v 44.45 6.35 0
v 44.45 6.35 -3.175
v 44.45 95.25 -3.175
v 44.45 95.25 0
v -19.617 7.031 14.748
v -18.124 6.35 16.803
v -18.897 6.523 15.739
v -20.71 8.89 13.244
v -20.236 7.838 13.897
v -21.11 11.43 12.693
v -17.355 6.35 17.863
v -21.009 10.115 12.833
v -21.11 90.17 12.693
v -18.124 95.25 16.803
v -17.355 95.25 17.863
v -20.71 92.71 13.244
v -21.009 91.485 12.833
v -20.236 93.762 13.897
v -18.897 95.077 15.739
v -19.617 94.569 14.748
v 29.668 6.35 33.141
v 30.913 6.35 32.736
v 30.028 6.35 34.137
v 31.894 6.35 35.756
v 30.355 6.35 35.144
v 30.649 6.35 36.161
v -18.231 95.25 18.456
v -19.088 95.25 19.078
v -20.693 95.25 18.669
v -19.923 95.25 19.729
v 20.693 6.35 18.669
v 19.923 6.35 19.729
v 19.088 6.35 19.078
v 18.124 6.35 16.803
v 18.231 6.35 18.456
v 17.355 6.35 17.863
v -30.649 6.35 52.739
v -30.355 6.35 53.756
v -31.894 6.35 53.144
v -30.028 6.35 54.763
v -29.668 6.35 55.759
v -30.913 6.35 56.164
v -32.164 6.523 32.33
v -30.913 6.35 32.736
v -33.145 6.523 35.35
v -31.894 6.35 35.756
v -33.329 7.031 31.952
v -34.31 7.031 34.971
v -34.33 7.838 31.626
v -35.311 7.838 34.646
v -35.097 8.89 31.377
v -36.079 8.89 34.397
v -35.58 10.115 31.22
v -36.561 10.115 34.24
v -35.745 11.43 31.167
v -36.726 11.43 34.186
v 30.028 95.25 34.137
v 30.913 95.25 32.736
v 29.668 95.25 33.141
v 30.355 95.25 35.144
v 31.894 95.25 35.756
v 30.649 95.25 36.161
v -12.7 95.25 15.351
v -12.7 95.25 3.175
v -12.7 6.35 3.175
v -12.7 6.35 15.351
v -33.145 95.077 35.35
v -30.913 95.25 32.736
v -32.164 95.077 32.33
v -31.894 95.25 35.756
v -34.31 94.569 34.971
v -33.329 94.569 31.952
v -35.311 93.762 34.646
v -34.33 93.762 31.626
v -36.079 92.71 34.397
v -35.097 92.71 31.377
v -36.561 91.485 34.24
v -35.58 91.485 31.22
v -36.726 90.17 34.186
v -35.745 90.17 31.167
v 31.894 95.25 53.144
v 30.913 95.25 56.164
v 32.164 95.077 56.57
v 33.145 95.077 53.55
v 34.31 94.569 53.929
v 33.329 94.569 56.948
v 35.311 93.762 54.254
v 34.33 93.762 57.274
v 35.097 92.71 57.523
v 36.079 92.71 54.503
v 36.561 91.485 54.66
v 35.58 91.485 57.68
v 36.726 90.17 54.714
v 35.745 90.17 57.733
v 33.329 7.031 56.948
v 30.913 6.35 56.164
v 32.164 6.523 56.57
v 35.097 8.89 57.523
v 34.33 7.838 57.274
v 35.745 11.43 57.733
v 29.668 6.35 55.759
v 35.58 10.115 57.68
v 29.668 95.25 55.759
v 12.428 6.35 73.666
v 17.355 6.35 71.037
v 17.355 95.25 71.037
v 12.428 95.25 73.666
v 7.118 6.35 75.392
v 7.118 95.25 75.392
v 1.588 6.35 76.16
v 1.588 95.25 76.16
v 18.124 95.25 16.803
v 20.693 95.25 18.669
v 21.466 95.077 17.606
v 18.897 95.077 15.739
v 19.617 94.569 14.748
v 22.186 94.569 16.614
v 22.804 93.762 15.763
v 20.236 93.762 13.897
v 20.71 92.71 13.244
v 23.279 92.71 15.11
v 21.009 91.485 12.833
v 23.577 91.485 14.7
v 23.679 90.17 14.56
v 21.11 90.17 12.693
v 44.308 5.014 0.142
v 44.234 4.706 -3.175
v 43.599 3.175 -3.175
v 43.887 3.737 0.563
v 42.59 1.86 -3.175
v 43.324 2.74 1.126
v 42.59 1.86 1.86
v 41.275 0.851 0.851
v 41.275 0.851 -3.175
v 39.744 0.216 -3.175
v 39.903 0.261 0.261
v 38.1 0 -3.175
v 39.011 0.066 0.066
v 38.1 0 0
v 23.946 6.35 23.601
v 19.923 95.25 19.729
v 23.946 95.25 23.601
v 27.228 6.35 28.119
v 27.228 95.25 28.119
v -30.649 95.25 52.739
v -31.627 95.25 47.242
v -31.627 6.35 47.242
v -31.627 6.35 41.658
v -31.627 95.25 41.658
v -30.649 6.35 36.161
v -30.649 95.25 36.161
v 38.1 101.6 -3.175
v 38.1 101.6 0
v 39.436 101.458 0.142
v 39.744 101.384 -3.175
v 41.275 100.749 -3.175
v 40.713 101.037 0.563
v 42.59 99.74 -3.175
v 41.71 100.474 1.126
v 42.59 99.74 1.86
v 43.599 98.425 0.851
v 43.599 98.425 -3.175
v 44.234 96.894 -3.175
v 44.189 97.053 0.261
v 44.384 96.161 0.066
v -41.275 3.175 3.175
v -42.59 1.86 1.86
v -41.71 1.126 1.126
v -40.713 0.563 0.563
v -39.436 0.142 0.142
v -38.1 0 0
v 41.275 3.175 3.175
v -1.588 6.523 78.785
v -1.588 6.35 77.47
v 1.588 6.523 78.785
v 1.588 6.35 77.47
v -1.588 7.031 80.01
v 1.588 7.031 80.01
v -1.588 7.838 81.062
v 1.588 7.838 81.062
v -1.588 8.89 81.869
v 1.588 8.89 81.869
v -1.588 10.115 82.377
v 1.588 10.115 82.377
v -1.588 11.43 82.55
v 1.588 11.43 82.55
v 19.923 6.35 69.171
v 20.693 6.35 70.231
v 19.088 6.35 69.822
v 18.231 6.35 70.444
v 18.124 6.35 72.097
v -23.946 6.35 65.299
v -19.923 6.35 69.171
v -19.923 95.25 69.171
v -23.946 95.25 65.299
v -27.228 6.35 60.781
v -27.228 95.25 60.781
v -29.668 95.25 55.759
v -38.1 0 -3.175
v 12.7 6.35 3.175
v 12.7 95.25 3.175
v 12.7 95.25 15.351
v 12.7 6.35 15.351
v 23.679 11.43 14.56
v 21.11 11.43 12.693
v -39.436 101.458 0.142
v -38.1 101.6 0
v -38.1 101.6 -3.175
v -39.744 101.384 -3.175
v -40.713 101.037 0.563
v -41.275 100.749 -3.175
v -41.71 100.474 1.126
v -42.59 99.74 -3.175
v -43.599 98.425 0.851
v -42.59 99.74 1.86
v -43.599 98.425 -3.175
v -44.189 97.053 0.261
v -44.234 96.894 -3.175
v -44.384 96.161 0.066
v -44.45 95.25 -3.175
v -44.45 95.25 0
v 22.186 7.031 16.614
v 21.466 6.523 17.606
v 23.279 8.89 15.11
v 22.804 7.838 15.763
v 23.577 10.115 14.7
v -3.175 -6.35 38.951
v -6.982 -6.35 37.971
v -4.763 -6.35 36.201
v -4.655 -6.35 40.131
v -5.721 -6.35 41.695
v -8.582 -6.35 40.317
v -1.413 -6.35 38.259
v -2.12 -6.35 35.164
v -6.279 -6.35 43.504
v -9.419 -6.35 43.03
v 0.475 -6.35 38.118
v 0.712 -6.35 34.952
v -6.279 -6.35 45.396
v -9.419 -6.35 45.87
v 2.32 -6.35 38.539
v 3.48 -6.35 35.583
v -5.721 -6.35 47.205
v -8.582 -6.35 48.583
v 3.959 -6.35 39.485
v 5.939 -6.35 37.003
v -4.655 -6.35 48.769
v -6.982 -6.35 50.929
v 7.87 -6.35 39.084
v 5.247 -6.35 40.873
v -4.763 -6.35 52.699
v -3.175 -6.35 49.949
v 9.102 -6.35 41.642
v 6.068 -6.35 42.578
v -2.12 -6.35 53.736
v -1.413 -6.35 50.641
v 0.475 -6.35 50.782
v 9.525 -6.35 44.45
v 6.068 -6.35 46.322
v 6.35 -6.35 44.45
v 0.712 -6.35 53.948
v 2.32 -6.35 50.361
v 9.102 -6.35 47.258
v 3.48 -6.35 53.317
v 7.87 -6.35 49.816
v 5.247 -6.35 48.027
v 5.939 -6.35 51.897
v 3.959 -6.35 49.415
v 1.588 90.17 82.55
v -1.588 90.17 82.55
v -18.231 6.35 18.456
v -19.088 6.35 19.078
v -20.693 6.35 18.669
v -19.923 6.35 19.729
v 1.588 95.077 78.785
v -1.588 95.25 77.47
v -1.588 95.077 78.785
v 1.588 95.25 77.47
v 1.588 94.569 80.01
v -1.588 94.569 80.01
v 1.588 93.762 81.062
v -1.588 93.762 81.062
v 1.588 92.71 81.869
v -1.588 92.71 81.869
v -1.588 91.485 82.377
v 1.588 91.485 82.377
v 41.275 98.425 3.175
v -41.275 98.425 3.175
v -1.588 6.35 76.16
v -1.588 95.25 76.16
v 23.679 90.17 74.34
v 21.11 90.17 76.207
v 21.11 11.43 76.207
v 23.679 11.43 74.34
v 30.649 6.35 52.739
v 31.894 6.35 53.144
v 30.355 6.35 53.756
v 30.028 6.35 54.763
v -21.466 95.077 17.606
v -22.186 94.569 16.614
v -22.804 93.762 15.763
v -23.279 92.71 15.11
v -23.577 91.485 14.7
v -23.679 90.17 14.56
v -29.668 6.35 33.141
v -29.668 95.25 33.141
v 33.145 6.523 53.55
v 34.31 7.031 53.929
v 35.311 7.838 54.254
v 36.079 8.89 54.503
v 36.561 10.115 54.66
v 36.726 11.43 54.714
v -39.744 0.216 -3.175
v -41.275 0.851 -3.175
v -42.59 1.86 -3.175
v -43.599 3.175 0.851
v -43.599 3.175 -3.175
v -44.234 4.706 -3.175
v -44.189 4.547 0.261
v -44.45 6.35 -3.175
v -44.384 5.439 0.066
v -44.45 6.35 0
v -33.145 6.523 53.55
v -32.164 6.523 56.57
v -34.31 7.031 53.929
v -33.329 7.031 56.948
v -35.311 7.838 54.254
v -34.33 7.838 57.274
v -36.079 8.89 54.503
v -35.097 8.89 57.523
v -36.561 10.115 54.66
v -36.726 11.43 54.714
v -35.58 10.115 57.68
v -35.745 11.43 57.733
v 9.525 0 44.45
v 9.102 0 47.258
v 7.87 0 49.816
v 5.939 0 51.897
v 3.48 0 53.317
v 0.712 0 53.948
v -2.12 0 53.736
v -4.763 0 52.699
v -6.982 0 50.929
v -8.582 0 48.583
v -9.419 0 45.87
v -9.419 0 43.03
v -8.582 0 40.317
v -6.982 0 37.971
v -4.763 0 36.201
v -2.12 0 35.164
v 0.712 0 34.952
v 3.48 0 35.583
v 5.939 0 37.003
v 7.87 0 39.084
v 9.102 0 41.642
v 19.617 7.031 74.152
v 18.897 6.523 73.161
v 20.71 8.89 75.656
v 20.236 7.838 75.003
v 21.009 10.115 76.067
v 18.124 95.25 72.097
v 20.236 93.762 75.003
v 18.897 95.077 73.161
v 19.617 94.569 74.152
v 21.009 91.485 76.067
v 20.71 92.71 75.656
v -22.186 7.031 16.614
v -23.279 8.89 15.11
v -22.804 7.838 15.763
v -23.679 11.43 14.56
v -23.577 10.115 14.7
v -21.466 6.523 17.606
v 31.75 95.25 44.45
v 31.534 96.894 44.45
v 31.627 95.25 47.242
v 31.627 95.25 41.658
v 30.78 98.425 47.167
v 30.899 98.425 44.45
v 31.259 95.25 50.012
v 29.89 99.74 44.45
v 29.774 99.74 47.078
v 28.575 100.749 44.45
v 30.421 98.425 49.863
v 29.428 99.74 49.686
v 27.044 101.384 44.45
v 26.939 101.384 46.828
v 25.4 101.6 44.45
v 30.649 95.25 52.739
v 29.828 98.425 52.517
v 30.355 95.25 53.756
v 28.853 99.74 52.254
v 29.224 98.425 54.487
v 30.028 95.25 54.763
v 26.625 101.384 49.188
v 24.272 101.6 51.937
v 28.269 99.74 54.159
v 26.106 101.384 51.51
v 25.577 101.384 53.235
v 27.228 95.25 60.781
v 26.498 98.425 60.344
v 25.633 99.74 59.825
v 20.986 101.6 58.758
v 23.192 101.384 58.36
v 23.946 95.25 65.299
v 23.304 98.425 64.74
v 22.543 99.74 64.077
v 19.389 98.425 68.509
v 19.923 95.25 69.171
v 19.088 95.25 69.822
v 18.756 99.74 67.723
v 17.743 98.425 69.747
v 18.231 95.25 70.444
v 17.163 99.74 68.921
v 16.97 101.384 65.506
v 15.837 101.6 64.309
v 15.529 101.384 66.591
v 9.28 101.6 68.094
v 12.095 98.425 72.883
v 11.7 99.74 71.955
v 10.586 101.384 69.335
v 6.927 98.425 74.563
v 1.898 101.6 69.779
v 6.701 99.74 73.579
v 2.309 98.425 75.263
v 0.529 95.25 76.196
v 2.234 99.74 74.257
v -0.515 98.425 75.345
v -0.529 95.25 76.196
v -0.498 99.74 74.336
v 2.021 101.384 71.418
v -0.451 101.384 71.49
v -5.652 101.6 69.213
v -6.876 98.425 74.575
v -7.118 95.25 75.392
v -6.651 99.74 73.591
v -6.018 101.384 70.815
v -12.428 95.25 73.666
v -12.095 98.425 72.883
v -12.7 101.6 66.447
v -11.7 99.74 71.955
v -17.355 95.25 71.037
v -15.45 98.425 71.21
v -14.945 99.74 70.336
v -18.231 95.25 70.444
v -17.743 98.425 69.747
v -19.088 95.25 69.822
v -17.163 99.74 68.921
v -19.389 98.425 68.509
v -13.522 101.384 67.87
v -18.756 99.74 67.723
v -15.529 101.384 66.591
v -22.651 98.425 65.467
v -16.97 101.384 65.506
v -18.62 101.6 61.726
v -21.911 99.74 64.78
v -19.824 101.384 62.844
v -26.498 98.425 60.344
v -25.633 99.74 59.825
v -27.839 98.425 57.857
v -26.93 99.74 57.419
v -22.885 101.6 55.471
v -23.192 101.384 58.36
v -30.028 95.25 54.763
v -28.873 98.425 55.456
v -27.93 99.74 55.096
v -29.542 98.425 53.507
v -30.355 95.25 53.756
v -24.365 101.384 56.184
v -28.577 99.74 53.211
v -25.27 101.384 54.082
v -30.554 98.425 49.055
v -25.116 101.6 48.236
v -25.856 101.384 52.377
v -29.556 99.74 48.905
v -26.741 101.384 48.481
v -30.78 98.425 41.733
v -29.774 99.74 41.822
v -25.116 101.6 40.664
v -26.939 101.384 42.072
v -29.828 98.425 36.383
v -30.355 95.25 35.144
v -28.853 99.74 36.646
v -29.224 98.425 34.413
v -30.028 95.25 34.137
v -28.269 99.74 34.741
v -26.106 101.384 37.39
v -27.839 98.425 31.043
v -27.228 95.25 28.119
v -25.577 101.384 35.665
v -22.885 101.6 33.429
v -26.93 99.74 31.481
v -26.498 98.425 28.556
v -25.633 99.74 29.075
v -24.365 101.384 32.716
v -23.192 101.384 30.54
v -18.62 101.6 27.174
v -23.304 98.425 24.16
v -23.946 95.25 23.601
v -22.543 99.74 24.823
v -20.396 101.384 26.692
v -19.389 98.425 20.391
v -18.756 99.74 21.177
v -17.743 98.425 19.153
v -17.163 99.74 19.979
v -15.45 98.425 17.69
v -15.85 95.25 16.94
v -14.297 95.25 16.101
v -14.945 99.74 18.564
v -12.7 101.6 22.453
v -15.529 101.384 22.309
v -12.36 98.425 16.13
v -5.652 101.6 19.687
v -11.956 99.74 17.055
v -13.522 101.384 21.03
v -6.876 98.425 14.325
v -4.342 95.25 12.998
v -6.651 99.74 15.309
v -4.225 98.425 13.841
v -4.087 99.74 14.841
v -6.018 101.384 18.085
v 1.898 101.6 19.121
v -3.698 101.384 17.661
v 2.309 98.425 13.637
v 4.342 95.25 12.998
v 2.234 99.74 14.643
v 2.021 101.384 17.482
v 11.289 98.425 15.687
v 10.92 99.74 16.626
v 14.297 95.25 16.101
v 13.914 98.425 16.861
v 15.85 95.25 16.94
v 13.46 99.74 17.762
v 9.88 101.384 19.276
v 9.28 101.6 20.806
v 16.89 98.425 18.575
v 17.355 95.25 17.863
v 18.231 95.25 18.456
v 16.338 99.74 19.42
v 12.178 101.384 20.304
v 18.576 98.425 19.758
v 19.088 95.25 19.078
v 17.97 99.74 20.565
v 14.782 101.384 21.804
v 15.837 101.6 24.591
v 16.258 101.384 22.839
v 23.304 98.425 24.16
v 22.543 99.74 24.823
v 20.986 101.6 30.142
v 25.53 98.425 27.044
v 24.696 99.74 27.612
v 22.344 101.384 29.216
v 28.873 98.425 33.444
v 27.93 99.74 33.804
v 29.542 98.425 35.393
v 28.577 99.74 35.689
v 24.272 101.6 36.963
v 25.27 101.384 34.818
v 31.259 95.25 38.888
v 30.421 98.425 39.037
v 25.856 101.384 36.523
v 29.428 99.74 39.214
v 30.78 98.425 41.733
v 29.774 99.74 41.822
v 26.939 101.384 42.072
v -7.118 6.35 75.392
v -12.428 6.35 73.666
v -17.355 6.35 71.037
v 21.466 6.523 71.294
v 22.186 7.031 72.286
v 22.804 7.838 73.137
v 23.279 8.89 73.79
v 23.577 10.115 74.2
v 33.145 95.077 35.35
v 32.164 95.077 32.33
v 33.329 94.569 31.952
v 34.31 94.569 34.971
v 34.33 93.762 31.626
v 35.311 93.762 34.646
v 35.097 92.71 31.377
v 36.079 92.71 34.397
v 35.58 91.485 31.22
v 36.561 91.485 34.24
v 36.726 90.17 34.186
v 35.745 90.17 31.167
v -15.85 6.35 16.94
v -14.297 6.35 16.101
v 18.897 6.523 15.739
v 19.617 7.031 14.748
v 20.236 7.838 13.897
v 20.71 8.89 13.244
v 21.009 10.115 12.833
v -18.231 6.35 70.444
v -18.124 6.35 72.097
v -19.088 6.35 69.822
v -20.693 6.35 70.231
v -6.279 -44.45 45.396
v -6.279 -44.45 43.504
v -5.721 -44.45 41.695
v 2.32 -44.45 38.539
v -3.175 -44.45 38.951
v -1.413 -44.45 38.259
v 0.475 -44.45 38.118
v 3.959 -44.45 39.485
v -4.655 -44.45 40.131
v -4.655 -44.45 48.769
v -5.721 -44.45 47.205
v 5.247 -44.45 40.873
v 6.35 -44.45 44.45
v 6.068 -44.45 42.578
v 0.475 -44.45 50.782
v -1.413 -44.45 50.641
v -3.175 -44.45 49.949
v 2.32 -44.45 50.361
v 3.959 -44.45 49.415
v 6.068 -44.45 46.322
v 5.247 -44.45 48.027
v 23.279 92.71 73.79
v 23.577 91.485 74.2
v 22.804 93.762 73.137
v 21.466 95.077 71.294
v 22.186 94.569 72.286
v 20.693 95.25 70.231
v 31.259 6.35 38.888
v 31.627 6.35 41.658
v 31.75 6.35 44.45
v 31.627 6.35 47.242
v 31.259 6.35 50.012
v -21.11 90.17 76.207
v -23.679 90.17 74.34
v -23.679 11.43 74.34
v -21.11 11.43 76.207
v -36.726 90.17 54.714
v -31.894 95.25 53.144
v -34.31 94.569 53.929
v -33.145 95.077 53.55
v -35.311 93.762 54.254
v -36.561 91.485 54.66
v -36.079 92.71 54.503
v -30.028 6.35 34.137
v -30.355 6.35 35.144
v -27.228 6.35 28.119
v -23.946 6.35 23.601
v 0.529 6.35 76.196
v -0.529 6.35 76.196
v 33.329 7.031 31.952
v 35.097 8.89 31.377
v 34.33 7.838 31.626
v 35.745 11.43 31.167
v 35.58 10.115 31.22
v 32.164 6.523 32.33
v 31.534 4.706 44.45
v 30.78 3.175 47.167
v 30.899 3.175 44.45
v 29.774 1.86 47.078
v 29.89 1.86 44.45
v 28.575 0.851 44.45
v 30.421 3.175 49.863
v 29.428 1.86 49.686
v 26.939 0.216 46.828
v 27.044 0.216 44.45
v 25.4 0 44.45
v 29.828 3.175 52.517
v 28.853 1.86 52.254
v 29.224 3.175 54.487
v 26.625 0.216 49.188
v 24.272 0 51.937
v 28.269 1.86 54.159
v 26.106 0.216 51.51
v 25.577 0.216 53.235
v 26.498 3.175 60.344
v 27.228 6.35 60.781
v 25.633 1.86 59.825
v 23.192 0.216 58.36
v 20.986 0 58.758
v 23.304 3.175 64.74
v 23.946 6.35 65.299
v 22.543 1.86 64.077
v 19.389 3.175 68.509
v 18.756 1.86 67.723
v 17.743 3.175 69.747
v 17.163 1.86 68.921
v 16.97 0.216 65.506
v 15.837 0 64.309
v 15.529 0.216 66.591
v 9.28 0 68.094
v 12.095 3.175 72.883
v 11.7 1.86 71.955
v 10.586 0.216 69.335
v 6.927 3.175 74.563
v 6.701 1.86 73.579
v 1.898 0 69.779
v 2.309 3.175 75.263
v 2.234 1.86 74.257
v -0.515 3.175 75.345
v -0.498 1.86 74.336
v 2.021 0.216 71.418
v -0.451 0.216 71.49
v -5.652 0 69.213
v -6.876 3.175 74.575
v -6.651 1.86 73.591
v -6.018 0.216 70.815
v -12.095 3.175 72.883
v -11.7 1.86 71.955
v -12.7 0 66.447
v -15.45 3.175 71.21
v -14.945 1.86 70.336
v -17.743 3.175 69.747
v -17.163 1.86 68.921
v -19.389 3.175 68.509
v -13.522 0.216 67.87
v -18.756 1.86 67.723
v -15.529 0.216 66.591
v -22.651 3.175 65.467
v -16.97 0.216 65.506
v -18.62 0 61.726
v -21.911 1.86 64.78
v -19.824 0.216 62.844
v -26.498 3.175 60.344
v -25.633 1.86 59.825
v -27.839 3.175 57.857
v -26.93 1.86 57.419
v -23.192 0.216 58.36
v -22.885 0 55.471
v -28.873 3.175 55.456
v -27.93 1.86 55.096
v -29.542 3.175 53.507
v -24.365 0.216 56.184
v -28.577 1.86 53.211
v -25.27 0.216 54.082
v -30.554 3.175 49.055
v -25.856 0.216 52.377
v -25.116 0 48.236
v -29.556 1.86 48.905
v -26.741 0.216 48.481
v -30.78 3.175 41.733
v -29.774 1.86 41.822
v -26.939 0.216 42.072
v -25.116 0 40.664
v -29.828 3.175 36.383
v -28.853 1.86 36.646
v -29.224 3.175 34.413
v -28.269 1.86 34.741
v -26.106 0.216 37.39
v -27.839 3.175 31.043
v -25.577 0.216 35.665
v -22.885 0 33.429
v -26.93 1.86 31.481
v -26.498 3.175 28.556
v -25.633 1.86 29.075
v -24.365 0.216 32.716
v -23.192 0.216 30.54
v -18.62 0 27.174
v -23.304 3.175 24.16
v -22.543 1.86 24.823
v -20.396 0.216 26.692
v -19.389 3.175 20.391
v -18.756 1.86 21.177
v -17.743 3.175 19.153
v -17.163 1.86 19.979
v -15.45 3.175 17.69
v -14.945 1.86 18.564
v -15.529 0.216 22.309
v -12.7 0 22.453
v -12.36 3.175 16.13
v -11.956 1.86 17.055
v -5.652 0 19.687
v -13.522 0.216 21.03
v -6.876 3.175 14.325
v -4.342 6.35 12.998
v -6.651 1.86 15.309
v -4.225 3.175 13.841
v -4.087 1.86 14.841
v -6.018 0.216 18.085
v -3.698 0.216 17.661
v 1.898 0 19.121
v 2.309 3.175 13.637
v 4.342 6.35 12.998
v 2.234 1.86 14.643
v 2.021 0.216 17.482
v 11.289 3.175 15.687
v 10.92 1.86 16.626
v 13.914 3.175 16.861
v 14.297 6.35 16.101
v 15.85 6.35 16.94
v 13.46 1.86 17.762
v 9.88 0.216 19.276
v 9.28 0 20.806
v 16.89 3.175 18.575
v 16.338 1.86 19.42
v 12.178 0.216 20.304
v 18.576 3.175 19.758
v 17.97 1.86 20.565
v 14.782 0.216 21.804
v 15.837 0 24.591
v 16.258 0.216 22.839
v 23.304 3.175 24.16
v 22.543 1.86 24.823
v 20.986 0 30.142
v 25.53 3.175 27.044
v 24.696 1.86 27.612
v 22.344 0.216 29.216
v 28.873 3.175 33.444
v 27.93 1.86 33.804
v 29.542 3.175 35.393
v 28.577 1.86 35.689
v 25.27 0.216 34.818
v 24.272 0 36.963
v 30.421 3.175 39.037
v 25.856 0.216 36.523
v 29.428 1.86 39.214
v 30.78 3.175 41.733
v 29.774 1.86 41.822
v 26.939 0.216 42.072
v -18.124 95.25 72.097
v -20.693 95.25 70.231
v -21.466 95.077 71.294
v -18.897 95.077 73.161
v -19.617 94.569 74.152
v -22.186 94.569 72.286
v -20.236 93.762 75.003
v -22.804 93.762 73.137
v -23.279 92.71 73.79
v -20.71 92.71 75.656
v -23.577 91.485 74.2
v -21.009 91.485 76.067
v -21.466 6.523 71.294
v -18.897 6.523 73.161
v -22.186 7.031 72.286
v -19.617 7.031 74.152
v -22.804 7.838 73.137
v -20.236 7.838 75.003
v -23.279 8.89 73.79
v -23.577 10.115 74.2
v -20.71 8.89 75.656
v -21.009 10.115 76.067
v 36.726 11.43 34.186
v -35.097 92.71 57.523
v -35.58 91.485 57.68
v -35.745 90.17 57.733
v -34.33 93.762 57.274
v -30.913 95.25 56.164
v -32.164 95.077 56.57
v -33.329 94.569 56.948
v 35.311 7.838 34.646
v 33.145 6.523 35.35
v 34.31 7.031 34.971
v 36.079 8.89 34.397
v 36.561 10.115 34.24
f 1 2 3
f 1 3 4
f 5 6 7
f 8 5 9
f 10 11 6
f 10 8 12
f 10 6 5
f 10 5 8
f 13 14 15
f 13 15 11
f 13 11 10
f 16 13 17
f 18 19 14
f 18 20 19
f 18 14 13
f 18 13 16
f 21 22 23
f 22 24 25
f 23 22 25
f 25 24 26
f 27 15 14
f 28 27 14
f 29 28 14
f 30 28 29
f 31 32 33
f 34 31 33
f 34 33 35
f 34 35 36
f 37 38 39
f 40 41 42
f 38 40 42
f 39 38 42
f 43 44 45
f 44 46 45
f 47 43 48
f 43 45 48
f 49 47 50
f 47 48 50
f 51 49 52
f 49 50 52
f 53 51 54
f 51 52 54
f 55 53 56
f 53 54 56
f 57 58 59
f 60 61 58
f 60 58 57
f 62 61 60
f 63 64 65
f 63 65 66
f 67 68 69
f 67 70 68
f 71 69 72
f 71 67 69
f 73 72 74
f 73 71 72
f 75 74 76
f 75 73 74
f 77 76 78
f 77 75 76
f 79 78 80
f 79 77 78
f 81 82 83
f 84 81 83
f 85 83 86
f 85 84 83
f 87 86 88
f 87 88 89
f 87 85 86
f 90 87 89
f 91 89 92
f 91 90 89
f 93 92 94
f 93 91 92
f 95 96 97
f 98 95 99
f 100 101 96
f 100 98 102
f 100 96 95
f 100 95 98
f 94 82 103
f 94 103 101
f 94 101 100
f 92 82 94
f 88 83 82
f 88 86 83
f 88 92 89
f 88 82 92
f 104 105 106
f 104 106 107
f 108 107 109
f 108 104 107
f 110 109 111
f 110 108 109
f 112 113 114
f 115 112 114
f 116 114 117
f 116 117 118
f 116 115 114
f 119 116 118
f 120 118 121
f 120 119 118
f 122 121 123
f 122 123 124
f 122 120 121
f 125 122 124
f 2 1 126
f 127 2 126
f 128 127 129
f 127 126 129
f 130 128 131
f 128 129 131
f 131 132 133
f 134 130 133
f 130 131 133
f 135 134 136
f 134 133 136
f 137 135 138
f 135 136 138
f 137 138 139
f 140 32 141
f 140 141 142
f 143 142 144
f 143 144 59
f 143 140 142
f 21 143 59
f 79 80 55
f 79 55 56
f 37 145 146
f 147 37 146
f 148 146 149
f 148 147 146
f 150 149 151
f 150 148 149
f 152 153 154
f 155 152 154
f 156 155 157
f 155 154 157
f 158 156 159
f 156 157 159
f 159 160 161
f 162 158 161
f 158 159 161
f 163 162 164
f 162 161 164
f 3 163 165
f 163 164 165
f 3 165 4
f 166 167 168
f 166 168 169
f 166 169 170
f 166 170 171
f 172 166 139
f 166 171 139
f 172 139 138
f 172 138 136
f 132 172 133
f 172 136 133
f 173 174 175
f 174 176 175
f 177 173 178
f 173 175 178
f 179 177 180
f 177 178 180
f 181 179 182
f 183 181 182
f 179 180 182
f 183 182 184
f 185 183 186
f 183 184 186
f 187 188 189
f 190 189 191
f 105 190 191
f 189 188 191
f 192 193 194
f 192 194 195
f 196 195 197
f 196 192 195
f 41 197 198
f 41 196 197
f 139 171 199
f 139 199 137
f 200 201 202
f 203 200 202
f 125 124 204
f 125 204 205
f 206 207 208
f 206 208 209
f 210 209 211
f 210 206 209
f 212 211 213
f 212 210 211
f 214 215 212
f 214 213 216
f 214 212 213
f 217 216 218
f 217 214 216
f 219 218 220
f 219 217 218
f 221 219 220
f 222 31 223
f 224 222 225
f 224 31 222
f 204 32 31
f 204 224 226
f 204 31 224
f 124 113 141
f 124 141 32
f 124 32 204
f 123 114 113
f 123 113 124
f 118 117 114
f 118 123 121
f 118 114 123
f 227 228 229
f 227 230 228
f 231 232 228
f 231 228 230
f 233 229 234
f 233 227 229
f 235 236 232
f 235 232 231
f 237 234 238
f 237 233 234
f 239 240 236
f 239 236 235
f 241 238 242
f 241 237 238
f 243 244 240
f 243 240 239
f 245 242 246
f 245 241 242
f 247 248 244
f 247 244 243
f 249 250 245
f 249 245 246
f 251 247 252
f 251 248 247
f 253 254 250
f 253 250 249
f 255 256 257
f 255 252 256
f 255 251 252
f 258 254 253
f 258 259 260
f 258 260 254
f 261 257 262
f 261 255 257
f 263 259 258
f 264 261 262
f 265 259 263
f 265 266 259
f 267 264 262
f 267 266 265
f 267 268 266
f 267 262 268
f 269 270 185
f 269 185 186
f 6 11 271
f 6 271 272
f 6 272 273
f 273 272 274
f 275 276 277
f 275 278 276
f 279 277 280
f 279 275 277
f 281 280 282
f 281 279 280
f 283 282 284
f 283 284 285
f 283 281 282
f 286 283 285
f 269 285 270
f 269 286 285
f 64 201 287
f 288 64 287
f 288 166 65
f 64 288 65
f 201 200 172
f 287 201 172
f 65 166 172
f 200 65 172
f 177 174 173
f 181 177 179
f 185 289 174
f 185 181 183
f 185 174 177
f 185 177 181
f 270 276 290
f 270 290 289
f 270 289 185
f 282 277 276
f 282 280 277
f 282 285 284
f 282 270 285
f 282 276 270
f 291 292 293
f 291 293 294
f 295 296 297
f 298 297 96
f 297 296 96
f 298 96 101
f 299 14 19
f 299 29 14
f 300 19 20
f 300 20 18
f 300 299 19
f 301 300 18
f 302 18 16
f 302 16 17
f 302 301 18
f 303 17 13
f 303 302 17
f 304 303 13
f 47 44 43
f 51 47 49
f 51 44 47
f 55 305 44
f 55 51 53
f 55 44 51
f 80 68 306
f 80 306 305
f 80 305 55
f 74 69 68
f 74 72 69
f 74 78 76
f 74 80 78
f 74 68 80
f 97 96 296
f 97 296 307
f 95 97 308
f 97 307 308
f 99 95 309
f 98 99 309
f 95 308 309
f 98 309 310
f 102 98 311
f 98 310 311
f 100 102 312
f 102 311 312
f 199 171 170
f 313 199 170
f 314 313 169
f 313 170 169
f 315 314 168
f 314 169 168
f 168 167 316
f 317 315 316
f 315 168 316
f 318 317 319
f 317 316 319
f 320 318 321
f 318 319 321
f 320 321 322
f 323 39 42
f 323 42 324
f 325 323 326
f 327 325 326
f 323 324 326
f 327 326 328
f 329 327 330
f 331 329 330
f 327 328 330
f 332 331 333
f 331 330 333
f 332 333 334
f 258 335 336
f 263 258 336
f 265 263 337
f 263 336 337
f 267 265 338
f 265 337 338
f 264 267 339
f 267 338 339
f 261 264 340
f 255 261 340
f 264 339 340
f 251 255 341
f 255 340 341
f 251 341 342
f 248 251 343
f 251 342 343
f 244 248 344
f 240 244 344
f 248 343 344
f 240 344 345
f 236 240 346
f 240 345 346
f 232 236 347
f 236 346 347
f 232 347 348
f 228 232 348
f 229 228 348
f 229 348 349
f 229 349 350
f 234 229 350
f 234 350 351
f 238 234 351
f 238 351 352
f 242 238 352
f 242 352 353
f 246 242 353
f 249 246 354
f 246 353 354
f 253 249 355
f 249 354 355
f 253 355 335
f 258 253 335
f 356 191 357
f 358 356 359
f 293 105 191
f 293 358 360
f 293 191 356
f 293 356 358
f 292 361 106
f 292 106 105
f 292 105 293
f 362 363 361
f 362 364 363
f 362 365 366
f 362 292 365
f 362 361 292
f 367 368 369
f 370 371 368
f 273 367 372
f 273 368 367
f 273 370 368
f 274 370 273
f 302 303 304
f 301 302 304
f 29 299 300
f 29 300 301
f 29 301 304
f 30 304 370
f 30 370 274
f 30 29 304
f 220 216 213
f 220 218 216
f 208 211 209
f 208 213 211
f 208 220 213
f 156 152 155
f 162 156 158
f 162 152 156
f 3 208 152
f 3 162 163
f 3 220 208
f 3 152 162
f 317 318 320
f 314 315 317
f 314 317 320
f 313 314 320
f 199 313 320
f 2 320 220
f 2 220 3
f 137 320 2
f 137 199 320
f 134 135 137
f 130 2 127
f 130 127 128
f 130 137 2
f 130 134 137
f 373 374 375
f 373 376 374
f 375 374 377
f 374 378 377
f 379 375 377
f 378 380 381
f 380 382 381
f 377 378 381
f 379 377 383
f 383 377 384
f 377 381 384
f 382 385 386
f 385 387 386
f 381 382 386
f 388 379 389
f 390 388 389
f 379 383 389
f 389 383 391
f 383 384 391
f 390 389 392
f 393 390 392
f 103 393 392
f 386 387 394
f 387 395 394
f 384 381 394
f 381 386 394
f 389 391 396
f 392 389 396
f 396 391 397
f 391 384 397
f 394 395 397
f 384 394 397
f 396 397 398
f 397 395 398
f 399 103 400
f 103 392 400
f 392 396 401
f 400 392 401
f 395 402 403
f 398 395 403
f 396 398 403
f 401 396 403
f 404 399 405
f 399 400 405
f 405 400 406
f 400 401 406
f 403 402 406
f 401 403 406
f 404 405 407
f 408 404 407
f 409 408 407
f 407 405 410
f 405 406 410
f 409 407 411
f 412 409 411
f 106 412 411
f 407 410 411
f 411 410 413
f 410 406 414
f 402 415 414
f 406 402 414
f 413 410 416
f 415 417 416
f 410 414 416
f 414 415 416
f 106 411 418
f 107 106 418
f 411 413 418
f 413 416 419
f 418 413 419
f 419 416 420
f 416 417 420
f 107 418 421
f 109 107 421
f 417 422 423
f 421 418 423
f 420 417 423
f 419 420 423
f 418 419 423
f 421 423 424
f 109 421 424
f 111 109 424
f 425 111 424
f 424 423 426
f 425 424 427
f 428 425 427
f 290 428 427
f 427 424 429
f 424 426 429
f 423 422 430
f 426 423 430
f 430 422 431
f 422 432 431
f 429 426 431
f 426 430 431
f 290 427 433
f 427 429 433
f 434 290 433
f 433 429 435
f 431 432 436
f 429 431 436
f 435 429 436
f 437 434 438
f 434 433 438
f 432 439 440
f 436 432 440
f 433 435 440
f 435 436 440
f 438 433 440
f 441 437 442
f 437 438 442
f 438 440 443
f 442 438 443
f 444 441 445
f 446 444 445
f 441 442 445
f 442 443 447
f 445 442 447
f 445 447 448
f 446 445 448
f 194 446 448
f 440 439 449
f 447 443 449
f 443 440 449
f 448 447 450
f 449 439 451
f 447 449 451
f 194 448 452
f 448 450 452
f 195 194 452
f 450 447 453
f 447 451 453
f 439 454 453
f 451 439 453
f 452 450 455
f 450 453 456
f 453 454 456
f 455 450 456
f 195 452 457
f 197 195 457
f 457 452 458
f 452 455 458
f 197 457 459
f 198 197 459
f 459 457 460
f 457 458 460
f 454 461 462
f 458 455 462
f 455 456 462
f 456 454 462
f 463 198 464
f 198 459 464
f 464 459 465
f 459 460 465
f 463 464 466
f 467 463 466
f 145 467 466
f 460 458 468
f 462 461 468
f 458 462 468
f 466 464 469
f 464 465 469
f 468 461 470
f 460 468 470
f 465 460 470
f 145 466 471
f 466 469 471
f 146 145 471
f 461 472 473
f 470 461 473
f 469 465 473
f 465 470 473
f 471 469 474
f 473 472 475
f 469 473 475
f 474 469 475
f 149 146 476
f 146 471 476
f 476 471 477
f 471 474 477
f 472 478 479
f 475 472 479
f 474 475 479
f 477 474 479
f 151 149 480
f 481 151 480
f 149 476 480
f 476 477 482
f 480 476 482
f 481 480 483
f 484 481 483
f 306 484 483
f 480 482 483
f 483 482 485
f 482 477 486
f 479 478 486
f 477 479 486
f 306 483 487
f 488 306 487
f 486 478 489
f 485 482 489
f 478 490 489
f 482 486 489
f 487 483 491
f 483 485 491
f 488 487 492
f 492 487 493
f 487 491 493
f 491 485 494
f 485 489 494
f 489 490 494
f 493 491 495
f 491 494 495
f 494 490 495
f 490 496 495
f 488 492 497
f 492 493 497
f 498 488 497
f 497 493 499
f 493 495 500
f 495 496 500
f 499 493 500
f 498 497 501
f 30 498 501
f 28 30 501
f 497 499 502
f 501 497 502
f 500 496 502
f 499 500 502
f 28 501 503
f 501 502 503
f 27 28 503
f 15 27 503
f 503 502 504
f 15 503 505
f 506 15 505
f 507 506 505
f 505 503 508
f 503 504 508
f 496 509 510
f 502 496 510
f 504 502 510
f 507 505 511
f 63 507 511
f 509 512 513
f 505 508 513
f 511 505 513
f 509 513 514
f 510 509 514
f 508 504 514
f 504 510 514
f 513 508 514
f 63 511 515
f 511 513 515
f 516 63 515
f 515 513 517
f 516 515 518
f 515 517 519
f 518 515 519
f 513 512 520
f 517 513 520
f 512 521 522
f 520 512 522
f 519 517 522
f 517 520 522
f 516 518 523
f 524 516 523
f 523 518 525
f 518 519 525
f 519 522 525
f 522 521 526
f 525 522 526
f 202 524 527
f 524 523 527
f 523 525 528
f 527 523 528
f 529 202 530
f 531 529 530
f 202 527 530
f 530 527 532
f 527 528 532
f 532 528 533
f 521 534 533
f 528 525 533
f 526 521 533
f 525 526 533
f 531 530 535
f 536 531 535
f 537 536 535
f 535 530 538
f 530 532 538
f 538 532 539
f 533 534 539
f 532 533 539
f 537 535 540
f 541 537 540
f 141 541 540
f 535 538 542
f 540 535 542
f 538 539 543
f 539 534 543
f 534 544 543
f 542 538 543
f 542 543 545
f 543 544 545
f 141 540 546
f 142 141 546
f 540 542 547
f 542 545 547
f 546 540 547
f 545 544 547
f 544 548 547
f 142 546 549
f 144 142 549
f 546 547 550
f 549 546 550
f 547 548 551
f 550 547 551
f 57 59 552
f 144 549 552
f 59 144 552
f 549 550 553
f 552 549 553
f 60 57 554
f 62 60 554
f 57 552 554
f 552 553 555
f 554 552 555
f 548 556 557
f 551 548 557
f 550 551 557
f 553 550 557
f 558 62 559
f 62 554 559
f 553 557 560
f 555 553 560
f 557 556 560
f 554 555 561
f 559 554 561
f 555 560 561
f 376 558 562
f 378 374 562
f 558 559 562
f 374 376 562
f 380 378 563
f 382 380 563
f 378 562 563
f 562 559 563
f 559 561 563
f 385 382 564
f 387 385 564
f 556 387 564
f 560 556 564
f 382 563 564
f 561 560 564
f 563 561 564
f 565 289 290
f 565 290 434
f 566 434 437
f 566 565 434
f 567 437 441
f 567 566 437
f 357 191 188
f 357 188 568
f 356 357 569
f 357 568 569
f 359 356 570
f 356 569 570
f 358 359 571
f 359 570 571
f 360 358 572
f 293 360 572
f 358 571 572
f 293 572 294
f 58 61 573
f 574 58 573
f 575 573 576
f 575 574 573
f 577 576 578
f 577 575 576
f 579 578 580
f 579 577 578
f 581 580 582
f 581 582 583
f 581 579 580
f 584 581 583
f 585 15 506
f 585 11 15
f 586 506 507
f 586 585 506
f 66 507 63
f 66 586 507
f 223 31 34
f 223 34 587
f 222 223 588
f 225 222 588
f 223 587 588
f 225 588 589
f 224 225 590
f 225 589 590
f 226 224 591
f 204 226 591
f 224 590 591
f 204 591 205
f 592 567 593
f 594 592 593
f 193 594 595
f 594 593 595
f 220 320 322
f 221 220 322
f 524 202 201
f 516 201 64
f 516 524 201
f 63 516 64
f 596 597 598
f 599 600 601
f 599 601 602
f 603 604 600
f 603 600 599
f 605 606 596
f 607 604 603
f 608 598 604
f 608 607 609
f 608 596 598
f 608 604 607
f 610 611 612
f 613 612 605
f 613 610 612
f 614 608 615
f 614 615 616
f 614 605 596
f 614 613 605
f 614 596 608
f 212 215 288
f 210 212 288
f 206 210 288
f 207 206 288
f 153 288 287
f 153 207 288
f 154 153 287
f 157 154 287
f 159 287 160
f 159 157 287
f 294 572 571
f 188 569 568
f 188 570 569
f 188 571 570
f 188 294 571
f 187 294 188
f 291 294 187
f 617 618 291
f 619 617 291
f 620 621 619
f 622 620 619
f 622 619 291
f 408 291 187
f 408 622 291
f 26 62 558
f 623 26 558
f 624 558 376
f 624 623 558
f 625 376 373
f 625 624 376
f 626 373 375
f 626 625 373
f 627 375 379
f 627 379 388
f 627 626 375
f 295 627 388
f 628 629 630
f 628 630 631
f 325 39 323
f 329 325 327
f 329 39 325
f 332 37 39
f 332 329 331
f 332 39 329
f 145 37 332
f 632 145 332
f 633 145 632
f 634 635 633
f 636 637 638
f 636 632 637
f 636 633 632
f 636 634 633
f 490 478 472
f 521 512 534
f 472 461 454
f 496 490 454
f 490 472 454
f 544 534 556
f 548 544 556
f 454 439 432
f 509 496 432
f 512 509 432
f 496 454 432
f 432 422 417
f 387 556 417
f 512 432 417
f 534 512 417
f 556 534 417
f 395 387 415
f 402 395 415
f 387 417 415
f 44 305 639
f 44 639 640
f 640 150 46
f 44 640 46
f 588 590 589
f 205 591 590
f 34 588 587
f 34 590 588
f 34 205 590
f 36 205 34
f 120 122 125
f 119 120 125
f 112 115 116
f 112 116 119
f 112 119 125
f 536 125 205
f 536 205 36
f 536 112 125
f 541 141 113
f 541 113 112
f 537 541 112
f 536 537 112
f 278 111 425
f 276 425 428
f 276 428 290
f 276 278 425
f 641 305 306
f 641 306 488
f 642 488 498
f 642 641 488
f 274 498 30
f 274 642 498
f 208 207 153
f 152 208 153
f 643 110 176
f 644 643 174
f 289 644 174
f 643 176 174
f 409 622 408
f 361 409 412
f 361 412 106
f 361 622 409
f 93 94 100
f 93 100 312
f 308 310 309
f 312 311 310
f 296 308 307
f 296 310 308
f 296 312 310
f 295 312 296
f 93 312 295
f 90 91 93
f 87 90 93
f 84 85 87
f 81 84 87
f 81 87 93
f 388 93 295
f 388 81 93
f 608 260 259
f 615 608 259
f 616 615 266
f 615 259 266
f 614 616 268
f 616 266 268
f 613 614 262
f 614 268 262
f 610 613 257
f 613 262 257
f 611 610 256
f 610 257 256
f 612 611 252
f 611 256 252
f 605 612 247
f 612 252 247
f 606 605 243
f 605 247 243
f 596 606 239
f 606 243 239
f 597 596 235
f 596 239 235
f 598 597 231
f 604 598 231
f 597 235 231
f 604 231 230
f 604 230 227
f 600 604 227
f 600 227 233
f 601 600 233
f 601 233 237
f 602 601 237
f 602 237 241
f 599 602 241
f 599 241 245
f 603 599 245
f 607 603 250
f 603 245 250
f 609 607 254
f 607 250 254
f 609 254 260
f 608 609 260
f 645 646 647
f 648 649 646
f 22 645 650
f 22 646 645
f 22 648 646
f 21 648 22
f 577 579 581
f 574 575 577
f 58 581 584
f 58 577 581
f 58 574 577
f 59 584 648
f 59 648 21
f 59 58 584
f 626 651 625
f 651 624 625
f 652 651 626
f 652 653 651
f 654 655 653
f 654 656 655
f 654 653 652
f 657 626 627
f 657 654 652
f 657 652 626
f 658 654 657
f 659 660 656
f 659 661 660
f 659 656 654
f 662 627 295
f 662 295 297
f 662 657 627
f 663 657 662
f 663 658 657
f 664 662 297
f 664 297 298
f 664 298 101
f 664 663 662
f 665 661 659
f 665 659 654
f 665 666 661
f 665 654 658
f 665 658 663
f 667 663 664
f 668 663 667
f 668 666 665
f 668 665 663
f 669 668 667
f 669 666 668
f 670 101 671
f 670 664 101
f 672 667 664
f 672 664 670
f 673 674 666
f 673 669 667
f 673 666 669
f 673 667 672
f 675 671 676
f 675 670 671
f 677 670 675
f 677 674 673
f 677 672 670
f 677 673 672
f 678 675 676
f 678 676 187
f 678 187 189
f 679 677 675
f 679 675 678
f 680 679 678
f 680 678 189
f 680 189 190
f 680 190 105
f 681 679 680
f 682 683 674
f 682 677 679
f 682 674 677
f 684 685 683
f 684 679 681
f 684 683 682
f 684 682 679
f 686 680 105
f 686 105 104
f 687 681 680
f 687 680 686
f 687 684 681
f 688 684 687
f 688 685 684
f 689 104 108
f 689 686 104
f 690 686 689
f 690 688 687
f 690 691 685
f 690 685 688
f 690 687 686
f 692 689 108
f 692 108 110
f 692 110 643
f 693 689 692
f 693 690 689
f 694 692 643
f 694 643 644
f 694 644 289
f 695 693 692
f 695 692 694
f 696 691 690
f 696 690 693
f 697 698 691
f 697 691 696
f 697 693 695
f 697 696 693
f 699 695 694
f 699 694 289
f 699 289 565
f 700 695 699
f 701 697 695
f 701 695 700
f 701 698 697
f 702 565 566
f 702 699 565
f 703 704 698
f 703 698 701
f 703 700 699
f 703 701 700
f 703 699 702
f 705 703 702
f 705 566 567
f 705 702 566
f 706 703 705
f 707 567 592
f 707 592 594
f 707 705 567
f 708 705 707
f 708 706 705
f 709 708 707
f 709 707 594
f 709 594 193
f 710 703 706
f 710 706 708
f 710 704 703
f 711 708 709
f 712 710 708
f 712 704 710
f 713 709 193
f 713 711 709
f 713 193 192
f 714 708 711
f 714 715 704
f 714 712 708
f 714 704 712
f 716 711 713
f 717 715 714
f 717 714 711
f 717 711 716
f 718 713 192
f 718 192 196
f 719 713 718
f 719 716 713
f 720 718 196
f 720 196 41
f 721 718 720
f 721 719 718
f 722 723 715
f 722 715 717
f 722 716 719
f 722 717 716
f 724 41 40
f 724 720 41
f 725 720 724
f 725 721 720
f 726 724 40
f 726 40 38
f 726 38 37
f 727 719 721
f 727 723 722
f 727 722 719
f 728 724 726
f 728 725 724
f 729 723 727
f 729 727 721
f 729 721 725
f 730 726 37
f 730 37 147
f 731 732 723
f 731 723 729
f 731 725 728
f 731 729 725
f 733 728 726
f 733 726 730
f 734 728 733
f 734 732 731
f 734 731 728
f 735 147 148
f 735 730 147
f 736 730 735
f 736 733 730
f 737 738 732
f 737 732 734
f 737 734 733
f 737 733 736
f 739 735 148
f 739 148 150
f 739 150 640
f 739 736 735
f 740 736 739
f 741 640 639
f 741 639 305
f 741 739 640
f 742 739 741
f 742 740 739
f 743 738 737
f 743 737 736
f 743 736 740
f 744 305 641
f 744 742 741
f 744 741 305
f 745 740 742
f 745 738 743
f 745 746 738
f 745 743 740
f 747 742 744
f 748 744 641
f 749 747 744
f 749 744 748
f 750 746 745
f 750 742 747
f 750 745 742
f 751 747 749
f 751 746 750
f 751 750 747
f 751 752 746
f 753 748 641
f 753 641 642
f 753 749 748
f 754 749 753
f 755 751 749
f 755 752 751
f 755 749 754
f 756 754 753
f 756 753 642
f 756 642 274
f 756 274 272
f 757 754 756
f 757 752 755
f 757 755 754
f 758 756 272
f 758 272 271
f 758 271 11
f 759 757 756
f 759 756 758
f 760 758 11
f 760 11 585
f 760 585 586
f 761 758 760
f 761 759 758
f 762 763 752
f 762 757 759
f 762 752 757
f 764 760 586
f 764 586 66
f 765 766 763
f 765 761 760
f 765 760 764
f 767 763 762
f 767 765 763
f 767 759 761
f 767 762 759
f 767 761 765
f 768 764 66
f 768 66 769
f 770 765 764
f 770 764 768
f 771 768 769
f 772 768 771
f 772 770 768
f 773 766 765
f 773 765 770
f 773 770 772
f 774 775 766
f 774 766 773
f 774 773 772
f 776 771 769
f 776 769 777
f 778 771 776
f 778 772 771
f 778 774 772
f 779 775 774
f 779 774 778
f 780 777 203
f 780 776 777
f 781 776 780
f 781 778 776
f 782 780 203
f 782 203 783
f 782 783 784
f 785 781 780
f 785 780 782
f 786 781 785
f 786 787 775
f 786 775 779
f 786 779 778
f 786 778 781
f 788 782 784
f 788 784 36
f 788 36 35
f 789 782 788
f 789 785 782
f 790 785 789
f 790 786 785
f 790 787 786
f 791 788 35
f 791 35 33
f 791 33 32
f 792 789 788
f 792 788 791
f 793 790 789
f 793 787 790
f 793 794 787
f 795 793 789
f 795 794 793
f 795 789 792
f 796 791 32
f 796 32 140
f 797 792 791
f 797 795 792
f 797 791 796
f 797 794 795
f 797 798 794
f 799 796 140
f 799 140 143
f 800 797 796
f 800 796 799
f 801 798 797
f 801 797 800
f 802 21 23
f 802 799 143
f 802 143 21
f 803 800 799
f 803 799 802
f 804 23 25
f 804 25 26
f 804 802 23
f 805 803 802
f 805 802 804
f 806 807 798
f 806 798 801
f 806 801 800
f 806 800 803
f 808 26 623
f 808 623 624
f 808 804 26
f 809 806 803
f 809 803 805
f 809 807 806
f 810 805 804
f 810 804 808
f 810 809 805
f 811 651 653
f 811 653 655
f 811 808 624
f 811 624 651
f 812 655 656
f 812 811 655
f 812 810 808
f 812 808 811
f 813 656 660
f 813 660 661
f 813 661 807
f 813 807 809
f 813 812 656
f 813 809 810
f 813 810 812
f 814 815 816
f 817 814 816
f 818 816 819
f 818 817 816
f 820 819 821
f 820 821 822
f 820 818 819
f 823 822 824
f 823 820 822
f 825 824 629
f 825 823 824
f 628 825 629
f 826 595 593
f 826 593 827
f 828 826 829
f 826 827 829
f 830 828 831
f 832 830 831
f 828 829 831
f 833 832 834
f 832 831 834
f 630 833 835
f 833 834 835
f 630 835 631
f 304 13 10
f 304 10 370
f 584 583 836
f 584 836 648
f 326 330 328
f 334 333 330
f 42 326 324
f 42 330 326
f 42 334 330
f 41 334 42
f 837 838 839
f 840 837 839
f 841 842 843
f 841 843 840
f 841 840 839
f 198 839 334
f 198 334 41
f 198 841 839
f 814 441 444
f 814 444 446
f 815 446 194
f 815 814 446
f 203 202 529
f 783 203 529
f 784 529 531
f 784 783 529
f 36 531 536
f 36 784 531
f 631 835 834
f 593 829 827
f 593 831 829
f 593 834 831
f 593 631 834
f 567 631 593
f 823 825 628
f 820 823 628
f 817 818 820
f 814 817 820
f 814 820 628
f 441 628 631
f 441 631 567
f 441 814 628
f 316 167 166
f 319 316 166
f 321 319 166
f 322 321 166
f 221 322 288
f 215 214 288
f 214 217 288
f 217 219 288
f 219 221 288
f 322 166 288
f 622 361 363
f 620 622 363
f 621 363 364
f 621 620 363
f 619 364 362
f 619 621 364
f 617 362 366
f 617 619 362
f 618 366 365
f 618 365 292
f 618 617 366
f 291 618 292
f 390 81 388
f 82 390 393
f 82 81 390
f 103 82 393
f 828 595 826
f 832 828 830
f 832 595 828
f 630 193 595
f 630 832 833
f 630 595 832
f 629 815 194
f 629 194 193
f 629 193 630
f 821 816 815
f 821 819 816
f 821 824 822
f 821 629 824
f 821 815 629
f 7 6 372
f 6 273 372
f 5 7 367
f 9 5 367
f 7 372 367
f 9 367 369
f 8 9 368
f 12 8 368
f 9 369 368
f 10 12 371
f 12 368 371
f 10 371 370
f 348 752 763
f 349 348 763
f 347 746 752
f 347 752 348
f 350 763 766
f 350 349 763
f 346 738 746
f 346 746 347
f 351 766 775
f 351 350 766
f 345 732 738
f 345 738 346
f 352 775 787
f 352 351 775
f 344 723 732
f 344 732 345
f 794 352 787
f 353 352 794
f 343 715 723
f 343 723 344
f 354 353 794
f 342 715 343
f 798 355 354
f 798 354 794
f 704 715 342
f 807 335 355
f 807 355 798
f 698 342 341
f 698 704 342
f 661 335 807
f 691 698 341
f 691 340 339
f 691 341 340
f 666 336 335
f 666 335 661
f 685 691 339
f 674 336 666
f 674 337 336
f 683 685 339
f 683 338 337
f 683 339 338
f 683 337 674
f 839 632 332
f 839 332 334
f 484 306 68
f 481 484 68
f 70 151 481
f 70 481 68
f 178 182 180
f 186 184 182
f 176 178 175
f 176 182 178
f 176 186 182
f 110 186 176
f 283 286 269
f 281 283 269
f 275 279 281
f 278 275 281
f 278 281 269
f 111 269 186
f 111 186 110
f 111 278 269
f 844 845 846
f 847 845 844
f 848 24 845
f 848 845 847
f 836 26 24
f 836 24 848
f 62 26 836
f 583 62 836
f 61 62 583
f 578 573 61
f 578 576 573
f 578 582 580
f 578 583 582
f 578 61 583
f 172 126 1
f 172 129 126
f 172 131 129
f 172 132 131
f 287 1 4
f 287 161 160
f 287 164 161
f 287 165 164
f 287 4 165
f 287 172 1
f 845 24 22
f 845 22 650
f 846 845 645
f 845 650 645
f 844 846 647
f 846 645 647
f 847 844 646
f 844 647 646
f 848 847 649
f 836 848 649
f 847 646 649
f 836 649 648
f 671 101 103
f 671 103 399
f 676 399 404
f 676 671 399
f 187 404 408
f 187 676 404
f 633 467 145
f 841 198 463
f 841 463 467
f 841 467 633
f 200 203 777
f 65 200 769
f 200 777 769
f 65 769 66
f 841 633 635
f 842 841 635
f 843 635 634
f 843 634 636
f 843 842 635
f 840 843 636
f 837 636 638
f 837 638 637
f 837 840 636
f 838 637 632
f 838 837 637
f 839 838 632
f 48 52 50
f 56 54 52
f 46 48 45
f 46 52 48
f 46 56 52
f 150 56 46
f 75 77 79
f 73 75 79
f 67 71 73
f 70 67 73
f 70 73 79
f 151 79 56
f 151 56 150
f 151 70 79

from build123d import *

# Parameters (mm, degrees)
F0_R      = 31.75
F1_DEPTH  = 101.6
F0_W      = 88.9
F0_H      = 6.35
F2_R      = 6.35
F3_SIZE   = 3.175
F6_DEPTH  = 88.9
F7_R      = 5.08
F8_W      = 12.7
F8_H      = 25.4
F9_DEPTH  = 88.9
F10_R     = 6.35
F11_R     = 9.525
F12_DEPTH = 6.35
F13_R     = 6.35
F14_DEPTH = 38.1


with BuildPart() as f1:
    # F0 (on Front) → F1 (new body)
    with BuildSketch(Plane.XZ):
        with Locations((0, 44.45)):
            Circle(F0_R)
    extrude(amount=-F1_DEPTH)

    # F2
    f2_edges = [f1.edges().sort_by_distance(p)[0] for p in [
        (-31.75, 0, 44.45),
        (-31.75, 101.6, 44.45),
    ]]
    fillet(f2_edges, radius=F2_R)

    # F5 (on offset) → F6 (join)
    with BuildSketch(Plane(origin=(0, 95.25, 0), x_dir=(-1, 0, 0), z_dir=(0, 1, 0))):
        Polygon((1.5875, 49.3358226153), (1.5875, 82.55), (-1.5875, 82.55), (-1.5875, 49.3358226153), (0, 47.1508163165), align=None)
        Polygon((21.1103036338, 76.2066565737), (1.5875, 49.3358226153), (1.5875, 46.6350062987), (4.1561289571, 47.4696044392), (23.6789325909, 74.3404383977), align=None)
        Polygon((1.5875, 46.6350062987), (1.5875, 49.3358226153), (0, 47.1508163165), (0.6063710429, 46.316218176), align=None)
        Polygon((0, 47.1508163165), (-1.5875, 49.3358226153), (-1.5875, 46.6350062987), (-0.6063710429, 46.316218176), align=None)
        Polygon((-1.5875, 46.6350062987), (-1.5875, 49.3358226153), (-21.1103036338, 76.2066565737), (-23.6789325909, 74.3404383977), (-4.1561289571, 47.4696044392), align=None)
        Polygon((4.1561289571, 47.4696044392), (1.5875, 46.6350062987), (1.5875, 45.6033862632), (2.5686289571, 45.2845981405), align=None)
        Polygon((-1.5875, 45.6033862632), (-1.5875, 46.6350062987), (-4.1561289571, 47.4696044392), (-2.5686289571, 45.2845981405), align=None)
        Polygon((35.7446887923, 57.7333497053), (4.1561289571, 47.4696044392), (2.5686289571, 45.2845981405), (5.1372579143, 44.45), (36.7258177494, 54.7137452661), align=None)
        Polygon((-2.5686289571, 45.2845981405), (-4.1561289571, 47.4696044392), (-35.7446887923, 57.7333497053), (-36.7258177494, 54.7137452661), (-5.1372579143, 44.45), align=None)
        Polygon((5.1372579143, 44.45), (2.5686289571, 45.2845981405), (1.9622579143, 44.45), (2.5686289571, 43.6154018595), align=None)
        Polygon((-1.9622579143, 44.45), (-2.5686289571, 45.2845981405), (-5.1372579143, 44.45), (-2.5686289571, 43.6154018595), align=None)
        Polygon((36.7258177494, 34.1862547339), (5.1372579143, 44.45), (2.5686289571, 43.6154018595), (4.1561289571, 41.4303955608), (35.7446887923, 31.1666502947), align=None)
        Polygon((-2.5686289571, 43.6154018595), (-5.1372579143, 44.45), (-36.7258177494, 34.1862547339), (-35.7446887923, 31.1666502947), (-4.1561289571, 41.4303955608), align=None)
        Polygon((2.5686289571, 43.6154018595), (1.5875, 43.2966137368), (1.5875, 42.2649937013), (4.1561289571, 41.4303955608), align=None)
        Polygon((-1.5875, 42.2649937013), (-1.5875, 43.2966137368), (-2.5686289571, 43.6154018595), (-4.1561289571, 41.4303955608), align=None)
        Polygon((4.1561289571, 41.4303955608), (1.5875, 42.2649937013), (1.5875, 39.5641773847), (21.1103036338, 12.6933434263), (23.6789325909, 14.5595616023), align=None)
        Polygon((1.5875, 39.5641773847), (1.5875, 42.2649937013), (0.6063710429, 42.583781824), (0, 41.7491836835), align=None)
        Polygon((-0.6063710429, 42.583781824), (-1.5875, 42.2649937013), (-1.5875, 39.5641773847), (0, 41.7491836835), align=None)
        Polygon((-1.5875, 39.5641773847), (-1.5875, 42.2649937013), (-4.1561289571, 41.4303955608), (-23.6789325909, 14.5595616023), (-21.1103036338, 12.6933434263), align=None)
        Polygon((1.5875, 6.35), (1.5875, 39.5641773847), (0, 41.7491836835), (-1.5875, 39.5641773847), (-1.5875, 6.35), align=None)
    extrude(amount=-F6_DEPTH)

    # F7
    f7_edges = [f1.edges().sort_by_distance(p)[0] for p in [
        (0, 95.25, 82.55),
        (-22.394618, 95.25, 75.273547),
        (22.394618, 95.25, 75.273547),
        (36.235253, 95.25, 56.223547),
        (36.235253, 95.25, 32.676453),
        (22.394618, 95.25, 13.626453),
        (0, 95.25, 6.35),
        (-22.394618, 95.25, 13.626453),
        (-36.235253, 95.25, 32.676453),
        (-36.235253, 95.25, 56.223547),
        (-36.235253, 6.35, 56.223547),
        (-36.235253, 6.35, 32.676453),
        (-22.394618, 6.35, 75.273547),
        (0, 6.35, 82.55),
        (22.394618, 6.35, 75.273547),
        (36.235253, 6.35, 56.223547),
        (36.235253, 6.35, 32.676453),
        (22.394618, 6.35, 13.626453),
        (0, 6.35, 6.35),
        (-22.394618, 6.35, 13.626453),
    ]]
    fillet(f7_edges, radius=F7_R)



with BuildPart() as f1b:
    # F0 (on Front) → F1, piece 2 (new body)
    with BuildSketch(Plane.XZ):
        Rectangle(F0_W, F0_H)
    extrude(amount=-F1_DEPTH)

    # F3
    f3_edges = [f1b.edges().sort_by_distance(p)[0] for p in [
        (0, 0, 3.175),
        (44.45, 50.8, 3.175),
        (-44.45, 50.8, 3.175),
        (0, 101.6, 3.175),
    ]]
    chamfer(f3_edges, length=F3_SIZE)


with BuildPart() as f1_1:
    add(f1.part)

    add(f1b.part)  # F9 merges F1b
    # F8 (on offset) → F9 (join)
    with BuildSketch(Plane(origin=(0, 95.25, 0), x_dir=(-1, 0, 0), z_dir=(0, 1, 0))):
        with Locations((6.35, 12.7)):
            Rectangle(F8_W, F8_H)
        with Locations((-6.35, 12.7)):
            Rectangle(F8_W, F8_H)
    extrude(amount=-F9_DEPTH)

    # F10
    f10_edges = [f1_1.edges().sort_by_distance(p)[0] for p in [
        (-44.45, 101.6, -1.5875),
        (44.45, 101.6, -1.5875),
        (44.45, 0, -1.5875),
        (-44.45, 0, -1.5875),
    ]]
    fillet(f10_edges, radius=F10_R)

    # F11 (on face) → F12 (join)
    with BuildSketch(Plane.XZ):
        with Locations((0, 44.45)):
            Circle(F11_R)
    extrude(amount=F12_DEPTH)

    # F13 (on face) → F14 (join)
    with BuildSketch(Plane.XZ.offset(6.35)):
        with Locations((0, 44.45)):
            Circle(F13_R)
    extrude(amount=F14_DEPTH)


solid = f1_1.part
